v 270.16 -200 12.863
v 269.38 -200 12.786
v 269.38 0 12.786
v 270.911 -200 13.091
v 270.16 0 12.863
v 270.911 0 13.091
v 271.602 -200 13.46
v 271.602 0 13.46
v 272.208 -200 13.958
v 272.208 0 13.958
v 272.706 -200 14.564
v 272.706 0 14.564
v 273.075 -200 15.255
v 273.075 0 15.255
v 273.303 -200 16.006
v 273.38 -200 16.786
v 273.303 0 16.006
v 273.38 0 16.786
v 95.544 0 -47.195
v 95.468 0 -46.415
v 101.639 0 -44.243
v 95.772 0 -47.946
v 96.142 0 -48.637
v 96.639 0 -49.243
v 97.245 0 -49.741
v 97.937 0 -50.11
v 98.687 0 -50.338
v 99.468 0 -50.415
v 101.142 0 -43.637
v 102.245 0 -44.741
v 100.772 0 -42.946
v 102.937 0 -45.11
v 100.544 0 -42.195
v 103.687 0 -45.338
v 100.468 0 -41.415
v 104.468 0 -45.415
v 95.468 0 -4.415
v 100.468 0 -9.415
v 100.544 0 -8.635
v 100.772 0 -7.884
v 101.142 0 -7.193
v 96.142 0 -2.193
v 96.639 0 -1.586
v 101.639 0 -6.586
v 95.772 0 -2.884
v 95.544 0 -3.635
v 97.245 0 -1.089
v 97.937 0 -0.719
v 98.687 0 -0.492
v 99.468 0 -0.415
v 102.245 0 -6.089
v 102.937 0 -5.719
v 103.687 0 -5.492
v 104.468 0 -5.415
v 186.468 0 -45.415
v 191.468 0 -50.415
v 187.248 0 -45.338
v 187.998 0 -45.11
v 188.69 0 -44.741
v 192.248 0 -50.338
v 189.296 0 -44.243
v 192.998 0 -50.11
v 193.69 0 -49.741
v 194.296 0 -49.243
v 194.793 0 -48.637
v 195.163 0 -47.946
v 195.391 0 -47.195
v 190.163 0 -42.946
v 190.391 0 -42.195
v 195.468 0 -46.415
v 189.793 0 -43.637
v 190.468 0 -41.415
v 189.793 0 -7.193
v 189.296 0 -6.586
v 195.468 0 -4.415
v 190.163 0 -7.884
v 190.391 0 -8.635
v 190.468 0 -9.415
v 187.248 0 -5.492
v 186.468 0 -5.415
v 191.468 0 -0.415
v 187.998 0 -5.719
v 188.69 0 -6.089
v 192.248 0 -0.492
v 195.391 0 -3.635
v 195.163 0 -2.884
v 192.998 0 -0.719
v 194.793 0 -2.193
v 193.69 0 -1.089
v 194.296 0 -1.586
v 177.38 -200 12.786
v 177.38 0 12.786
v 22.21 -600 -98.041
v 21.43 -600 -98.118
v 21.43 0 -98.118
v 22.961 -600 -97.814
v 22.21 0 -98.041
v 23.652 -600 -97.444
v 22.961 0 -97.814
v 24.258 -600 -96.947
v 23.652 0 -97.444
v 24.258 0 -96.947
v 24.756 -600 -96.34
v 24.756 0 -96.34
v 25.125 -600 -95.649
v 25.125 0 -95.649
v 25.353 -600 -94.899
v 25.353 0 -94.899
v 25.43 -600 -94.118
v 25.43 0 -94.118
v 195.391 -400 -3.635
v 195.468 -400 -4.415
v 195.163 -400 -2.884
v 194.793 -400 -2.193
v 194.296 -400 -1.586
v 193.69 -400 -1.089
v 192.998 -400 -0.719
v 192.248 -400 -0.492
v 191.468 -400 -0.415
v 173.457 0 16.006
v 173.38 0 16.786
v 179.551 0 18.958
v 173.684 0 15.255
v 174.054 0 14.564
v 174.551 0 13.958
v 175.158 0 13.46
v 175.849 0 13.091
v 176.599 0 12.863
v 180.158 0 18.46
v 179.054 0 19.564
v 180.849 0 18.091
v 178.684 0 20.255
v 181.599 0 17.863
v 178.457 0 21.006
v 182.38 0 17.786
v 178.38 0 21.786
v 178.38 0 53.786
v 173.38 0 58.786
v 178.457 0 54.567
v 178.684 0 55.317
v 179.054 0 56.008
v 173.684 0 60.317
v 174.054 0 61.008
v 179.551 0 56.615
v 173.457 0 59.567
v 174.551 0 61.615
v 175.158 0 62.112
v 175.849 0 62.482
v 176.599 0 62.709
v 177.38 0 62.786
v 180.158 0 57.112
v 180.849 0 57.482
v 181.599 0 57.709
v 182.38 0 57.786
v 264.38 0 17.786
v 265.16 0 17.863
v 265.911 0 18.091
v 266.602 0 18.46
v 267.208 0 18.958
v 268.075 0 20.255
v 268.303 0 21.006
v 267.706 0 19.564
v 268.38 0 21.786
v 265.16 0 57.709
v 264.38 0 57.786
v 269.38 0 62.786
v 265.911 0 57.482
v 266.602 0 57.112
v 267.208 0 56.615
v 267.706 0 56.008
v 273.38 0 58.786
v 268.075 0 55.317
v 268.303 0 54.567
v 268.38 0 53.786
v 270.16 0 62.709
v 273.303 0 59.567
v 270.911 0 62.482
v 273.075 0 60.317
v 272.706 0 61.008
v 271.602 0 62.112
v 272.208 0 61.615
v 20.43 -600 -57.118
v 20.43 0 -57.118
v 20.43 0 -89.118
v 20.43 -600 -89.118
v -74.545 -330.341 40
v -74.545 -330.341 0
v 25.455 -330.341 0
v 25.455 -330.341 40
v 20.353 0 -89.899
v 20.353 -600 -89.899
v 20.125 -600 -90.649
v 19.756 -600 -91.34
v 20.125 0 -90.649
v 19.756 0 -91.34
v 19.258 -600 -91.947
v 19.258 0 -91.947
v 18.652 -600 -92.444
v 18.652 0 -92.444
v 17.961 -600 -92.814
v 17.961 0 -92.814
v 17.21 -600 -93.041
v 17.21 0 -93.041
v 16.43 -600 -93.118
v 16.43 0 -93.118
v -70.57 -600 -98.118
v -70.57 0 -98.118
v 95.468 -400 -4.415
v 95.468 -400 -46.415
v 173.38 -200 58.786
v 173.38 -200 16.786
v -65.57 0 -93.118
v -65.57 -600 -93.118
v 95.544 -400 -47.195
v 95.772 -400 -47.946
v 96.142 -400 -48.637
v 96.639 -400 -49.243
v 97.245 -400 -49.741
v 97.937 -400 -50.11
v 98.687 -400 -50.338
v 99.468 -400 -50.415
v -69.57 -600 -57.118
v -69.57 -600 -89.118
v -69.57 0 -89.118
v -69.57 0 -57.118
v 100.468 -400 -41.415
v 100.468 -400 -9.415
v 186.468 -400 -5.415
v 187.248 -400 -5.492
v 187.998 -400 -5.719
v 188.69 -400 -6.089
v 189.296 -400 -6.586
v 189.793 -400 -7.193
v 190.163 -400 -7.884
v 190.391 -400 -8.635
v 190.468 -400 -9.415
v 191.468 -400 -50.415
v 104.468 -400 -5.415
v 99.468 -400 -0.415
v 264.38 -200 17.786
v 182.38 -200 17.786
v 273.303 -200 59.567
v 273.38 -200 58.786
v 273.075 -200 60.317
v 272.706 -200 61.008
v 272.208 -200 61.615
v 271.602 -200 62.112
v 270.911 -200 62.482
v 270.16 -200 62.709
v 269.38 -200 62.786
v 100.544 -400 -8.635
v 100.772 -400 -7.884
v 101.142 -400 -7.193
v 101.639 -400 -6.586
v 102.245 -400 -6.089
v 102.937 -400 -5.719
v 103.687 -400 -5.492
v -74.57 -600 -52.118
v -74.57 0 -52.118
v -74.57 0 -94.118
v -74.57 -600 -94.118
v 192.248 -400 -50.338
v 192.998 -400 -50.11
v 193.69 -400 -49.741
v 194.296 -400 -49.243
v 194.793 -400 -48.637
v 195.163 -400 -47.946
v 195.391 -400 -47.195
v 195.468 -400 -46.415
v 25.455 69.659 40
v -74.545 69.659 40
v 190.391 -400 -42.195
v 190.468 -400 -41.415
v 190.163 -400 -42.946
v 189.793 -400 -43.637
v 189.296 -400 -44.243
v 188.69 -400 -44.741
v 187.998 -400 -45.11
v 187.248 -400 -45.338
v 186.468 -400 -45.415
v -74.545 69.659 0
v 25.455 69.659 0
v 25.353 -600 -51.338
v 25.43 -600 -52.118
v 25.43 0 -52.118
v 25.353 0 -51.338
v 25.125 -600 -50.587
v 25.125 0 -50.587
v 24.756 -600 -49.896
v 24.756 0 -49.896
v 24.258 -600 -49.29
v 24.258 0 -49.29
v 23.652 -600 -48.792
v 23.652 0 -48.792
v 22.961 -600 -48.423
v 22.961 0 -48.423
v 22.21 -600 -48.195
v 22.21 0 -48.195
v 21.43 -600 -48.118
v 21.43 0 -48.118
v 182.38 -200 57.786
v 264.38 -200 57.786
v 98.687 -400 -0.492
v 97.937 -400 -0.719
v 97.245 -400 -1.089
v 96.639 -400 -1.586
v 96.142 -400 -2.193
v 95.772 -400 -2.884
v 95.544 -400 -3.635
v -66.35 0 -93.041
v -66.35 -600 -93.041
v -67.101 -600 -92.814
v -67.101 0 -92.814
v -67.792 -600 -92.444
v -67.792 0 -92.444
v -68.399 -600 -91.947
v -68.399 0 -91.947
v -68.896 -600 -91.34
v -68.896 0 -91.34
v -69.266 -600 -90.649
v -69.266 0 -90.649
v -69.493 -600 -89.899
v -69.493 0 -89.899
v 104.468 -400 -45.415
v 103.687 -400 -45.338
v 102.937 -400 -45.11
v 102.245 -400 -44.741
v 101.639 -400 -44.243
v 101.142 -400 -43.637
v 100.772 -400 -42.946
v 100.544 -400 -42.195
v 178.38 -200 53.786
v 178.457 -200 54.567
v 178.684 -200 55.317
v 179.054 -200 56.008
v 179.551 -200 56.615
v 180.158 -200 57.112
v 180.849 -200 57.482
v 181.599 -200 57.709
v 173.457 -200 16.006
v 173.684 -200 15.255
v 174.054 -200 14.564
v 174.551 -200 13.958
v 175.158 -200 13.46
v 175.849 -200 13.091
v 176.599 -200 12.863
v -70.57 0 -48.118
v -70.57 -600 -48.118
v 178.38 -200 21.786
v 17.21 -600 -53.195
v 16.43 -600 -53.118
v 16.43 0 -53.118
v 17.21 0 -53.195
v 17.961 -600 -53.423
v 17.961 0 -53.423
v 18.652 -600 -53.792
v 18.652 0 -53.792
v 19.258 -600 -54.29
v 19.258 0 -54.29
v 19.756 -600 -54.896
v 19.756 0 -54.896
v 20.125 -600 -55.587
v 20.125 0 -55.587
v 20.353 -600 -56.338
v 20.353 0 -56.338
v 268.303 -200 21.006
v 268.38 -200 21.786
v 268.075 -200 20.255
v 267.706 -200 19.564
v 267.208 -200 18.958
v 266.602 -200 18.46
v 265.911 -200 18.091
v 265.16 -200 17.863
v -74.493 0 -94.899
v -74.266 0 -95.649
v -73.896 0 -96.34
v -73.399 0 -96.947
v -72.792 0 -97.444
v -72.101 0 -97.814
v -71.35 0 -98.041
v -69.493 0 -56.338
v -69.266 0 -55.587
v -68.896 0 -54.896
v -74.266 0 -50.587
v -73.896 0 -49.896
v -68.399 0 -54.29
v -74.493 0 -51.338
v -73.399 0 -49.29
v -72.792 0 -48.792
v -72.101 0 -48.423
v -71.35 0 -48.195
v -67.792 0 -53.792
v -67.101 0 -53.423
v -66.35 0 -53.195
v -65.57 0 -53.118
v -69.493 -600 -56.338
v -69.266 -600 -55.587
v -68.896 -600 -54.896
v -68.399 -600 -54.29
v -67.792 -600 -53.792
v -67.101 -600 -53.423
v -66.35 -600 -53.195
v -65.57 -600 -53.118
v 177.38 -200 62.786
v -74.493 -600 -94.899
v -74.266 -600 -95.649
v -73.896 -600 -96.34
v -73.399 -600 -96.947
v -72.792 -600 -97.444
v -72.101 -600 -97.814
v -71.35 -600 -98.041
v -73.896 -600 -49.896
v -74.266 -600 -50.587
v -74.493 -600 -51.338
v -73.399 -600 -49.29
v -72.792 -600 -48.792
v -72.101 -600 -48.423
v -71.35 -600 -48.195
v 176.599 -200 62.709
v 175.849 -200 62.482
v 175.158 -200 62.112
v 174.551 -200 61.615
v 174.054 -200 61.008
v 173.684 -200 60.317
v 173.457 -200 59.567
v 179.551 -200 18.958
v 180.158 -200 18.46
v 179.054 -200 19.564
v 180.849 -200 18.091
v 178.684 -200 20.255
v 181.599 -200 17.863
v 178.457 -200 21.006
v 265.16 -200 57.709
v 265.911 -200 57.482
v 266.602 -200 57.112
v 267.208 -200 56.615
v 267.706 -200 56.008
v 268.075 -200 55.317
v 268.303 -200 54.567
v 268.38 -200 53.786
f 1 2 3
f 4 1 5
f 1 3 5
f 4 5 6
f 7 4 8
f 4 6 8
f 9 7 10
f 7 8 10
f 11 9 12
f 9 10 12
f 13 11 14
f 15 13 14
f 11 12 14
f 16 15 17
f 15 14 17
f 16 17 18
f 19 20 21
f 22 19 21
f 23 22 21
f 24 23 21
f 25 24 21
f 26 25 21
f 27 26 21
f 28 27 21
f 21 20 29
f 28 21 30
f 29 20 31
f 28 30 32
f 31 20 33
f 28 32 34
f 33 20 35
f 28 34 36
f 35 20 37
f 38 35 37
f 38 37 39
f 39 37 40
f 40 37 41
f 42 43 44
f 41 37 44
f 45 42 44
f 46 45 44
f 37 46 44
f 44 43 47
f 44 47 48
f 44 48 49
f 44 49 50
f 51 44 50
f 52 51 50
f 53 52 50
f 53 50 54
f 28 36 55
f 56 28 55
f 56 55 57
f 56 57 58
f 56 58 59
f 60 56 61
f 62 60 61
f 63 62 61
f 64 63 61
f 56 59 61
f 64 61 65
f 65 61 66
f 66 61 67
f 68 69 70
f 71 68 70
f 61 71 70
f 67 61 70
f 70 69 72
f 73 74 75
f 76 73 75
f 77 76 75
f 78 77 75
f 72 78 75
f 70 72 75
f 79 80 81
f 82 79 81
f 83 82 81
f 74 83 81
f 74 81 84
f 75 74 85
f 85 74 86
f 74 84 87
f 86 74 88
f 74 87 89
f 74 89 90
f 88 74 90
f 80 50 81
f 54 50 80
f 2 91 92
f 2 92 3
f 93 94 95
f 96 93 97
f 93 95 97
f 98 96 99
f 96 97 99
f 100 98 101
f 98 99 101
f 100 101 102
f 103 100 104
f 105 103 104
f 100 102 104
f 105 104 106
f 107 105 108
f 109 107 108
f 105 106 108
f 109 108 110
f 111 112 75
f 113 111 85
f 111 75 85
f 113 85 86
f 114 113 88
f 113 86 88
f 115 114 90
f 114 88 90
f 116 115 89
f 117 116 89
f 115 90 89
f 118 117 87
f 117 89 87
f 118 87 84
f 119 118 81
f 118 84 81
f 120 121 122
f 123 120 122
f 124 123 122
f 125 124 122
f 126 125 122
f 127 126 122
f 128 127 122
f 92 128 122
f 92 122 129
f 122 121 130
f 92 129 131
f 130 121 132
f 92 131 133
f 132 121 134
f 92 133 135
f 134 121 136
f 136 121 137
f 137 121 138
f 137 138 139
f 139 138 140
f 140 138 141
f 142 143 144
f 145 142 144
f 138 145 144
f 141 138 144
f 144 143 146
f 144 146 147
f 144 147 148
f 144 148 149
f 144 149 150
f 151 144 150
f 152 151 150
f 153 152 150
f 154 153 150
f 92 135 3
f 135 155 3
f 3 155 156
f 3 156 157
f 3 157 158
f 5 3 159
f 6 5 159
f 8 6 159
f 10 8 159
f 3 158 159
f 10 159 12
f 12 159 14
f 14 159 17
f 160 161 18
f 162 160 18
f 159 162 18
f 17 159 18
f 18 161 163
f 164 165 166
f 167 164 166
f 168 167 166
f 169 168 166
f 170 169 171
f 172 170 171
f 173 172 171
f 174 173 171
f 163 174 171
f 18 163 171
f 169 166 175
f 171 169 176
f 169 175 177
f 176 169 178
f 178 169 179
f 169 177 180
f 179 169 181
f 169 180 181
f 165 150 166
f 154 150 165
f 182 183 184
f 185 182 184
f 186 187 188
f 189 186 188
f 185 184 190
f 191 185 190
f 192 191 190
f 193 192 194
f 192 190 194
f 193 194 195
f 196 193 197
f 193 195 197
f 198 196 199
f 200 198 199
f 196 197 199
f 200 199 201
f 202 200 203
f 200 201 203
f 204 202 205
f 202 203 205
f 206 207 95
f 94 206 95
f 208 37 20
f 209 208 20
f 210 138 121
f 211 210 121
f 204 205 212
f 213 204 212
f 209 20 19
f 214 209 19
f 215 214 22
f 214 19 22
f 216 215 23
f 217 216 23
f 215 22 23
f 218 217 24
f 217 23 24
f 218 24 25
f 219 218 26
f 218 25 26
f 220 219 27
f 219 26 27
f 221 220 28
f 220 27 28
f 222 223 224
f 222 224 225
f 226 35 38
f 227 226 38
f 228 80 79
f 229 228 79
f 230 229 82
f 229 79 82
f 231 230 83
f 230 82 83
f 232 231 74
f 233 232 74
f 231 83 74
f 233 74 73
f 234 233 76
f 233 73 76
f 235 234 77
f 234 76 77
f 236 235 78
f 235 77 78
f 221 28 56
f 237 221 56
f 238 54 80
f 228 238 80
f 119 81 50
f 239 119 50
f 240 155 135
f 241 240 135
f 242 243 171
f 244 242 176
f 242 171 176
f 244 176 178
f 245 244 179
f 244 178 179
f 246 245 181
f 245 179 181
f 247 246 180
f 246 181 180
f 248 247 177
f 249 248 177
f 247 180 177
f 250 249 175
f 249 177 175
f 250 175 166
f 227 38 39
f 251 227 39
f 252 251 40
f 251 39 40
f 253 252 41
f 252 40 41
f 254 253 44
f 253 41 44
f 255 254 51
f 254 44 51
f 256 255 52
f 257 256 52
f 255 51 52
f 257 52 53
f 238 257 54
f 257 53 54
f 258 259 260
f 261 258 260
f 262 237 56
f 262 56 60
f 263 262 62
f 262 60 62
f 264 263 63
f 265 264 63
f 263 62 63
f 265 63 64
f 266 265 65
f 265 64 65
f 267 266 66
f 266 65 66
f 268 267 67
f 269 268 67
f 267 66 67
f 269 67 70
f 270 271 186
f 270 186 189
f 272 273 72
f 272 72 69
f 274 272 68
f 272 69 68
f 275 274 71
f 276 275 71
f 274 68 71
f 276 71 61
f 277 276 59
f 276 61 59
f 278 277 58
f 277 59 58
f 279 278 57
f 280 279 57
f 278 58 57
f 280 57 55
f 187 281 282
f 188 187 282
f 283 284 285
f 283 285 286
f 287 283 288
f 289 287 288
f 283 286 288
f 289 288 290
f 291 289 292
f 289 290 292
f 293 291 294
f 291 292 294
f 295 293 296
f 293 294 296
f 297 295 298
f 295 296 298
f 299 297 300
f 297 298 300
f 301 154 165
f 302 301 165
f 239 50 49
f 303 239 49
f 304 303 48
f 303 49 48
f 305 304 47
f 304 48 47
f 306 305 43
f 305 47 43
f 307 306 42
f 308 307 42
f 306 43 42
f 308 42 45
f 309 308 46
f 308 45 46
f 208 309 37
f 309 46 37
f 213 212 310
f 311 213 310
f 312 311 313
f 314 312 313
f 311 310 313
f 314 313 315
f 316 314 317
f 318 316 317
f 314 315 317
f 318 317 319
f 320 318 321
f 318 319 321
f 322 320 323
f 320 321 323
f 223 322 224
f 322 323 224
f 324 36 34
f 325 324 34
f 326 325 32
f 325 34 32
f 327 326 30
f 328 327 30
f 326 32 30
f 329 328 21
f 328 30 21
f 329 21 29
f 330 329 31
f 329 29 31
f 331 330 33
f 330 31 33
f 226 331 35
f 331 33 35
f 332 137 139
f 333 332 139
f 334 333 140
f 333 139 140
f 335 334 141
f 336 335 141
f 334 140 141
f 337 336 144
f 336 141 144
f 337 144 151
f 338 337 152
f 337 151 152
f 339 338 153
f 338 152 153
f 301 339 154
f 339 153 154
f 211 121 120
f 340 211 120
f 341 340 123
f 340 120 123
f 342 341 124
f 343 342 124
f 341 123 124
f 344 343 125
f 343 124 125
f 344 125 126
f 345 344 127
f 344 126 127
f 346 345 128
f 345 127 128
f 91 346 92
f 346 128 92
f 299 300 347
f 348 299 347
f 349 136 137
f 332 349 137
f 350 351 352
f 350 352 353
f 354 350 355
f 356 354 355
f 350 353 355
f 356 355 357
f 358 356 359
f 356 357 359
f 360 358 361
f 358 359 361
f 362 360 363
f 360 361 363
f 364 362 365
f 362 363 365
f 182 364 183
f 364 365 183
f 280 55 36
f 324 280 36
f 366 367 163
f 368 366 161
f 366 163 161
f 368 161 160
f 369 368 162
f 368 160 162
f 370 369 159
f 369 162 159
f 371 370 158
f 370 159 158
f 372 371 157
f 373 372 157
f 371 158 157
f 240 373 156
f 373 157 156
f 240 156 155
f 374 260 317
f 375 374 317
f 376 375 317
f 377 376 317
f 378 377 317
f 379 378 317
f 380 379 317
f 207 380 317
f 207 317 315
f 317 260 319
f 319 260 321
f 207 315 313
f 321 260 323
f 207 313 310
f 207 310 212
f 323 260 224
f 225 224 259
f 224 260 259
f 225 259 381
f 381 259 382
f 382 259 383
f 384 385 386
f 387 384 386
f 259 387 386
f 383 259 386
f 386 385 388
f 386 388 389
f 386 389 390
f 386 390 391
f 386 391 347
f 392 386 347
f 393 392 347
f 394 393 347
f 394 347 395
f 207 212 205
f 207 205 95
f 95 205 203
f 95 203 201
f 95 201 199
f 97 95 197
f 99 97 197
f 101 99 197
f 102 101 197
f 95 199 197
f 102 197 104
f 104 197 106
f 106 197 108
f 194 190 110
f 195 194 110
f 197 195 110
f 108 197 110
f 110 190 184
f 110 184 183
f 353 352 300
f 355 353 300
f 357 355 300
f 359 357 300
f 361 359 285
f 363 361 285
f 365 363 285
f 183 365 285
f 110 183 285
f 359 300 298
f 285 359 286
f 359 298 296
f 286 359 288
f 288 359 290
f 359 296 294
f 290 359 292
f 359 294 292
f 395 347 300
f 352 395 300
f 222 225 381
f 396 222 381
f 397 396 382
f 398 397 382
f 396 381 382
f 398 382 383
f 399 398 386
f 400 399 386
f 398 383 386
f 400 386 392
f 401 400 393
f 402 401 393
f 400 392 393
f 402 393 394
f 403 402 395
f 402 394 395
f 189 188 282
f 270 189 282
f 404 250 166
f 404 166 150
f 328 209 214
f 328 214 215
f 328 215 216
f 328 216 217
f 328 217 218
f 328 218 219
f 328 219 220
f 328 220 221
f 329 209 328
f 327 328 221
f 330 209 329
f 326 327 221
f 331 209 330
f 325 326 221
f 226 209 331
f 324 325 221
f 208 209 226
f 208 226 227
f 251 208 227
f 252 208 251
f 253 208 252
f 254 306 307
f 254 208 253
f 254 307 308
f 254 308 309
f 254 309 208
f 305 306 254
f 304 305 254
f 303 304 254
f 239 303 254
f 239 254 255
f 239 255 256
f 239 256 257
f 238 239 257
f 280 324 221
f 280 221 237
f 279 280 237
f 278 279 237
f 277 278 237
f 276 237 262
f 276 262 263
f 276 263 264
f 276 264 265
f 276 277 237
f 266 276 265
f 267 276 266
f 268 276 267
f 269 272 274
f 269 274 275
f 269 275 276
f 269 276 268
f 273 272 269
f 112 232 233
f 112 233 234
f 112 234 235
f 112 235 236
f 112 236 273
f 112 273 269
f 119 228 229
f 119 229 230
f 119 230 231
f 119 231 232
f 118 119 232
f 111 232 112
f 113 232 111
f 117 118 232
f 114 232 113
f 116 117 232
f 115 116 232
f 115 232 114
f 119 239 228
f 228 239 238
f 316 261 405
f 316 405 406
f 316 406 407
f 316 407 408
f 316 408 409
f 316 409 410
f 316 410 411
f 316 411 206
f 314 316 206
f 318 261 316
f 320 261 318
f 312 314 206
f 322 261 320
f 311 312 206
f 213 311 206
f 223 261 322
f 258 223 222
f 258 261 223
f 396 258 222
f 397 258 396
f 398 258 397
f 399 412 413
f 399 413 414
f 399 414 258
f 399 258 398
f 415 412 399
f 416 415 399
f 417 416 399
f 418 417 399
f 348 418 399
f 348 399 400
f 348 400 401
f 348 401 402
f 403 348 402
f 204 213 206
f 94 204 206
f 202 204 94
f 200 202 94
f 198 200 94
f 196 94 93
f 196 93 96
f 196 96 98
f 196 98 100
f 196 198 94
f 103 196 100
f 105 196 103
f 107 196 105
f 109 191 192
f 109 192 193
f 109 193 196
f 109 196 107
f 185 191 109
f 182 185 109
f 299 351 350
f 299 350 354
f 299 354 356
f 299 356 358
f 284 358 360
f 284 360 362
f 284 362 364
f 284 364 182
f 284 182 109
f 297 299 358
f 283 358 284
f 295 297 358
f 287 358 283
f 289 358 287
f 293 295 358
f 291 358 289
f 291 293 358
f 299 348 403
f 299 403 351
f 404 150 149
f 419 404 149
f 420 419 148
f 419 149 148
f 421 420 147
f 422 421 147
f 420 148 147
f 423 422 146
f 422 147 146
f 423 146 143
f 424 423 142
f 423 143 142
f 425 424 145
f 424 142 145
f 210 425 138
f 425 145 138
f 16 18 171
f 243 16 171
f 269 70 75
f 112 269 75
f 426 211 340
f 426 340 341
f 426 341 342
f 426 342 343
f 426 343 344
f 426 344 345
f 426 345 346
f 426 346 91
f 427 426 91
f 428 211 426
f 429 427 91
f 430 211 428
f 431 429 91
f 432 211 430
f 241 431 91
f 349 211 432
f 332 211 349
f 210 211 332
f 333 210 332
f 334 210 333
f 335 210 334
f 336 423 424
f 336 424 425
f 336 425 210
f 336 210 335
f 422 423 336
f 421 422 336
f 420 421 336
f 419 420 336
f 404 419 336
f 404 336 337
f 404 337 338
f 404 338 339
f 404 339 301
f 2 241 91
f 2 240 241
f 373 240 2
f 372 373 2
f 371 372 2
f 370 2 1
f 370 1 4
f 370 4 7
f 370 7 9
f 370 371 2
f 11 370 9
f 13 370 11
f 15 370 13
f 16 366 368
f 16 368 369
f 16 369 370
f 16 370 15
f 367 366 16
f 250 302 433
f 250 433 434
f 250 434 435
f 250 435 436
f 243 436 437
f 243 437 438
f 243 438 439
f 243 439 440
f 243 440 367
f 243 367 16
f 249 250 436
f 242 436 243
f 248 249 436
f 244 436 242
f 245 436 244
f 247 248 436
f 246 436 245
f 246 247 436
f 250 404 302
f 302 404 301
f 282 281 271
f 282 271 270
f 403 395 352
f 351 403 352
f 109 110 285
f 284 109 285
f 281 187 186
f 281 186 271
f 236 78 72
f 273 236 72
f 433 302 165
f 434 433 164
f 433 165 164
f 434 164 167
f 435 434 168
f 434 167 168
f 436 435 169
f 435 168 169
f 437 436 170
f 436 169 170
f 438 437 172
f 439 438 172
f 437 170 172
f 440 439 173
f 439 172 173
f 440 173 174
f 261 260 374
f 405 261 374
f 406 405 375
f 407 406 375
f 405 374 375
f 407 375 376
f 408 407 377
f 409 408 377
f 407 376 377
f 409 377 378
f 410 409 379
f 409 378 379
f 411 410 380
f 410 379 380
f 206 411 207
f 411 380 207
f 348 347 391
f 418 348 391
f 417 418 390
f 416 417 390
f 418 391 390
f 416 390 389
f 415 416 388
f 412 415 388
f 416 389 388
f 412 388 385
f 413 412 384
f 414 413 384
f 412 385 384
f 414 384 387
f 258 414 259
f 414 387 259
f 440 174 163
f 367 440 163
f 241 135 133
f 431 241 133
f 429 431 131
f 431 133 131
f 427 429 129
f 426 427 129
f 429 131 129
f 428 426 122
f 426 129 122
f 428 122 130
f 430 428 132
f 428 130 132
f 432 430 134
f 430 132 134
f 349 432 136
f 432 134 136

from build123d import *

# Parameters (mm, degrees)
F0_W     = 100
F0_H     = 400
F1_DEPTH = 40
F3_DEPTH = 600
F5_DEPTH = 400
F7_DEPTH = 200


with BuildPart() as f1:
    # F0 (on Top) → F1 (new body)
    with BuildSketch(Plane.XY):
        with Locations((-24.545455, -130.340915)):
            Rectangle(F0_W, F0_H)
    extrude(amount=F1_DEPTH)


with BuildPart() as f3:
    # F2 (on Front) → F3 (new body)
    with BuildSketch(Plane.XZ):
        with BuildLine():
            Line((21.429882, -48.118195), (-70.570118, -48.118195))
            ThreePointArc((-70.570118, -48.118195), (-73.398545, -49.289768), (-74.570118, -52.118195))
            Line((-74.570118, -52.118195), (-74.570118, -94.118195))
            ThreePointArc((-74.570118, -94.118195), (-73.398545, -96.946623), (-70.570118, -98.118195))
            Line((-70.570118, -98.118195), (21.429882, -98.118195))
            ThreePointArc((21.429882, -98.118195), (24.258309, -96.946623), (25.429882, -94.118195))
            Line((25.429882, -94.118195), (25.429882, -52.118195))
            ThreePointArc((25.429882, -52.118195), (24.258309, -49.289768), (21.429882, -48.118195))
        make_face()
        with BuildLine():
            ThreePointArc((-69.570118, -57.118195), (-68.398545, -54.289768), (-65.570118, -53.118195))
            Line((-65.570118, -53.118195), (16.429882, -53.118195))
            ThreePointArc((16.429882, -53.118195), (19.258309, -54.289768), (20.429882, -57.118195))
            Line((20.429882, -57.118195), (20.429882, -89.118195))
            ThreePointArc((20.429882, -89.118195), (19.258309, -91.946623), (16.429882, -93.118195))
            Line((16.429882, -93.118195), (-65.570118, -93.118195))
            ThreePointArc((-65.570118, -93.118195), (-68.398545, -91.946623), (-69.570118, -89.118195))
            Line((-69.570118, -89.118195), (-69.570118, -57.118195))
        make_face(mode=Mode.SUBTRACT)
    extrude(amount=F3_DEPTH)


with BuildPart() as f5:
    # F4 (on Front) → F5 (new body)
    with BuildSketch(Plane.XZ):
        with BuildLine():
            Line((191.467564, -0.414899), (99.467564, -0.414899))
            ThreePointArc((99.467564, -0.414899), (96.639137, -1.586472), (95.467564, -4.414899))
            Line((95.467564, -4.414899), (95.467564, -46.414899))
            ThreePointArc((95.467564, -46.414899), (96.639137, -49.243326), (99.467564, -50.414899))
            Line((99.467564, -50.414899), (191.467564, -50.414899))
            ThreePointArc((191.467564, -50.414899), (194.295992, -49.243326), (195.467564, -46.414899))
            Line((195.467564, -46.414899), (195.467564, -4.414899))
            ThreePointArc((195.467564, -4.414899), (194.295992, -1.586472), (191.467564, -0.414899))
        make_face()
        with BuildLine():
            ThreePointArc((100.467564, -9.414899), (101.639137, -6.586472), (104.467564, -5.414899))
            Line((104.467564, -5.414899), (186.467564, -5.414899))
            ThreePointArc((186.467564, -5.414899), (189.295992, -6.586472), (190.467564, -9.414899))
            Line((190.467564, -9.414899), (190.467564, -41.414899))
            ThreePointArc((190.467564, -41.414899), (189.295992, -44.243326), (186.467564, -45.414899))
            Line((186.467564, -45.414899), (104.467564, -45.414899))
            ThreePointArc((104.467564, -45.414899), (101.639137, -44.243326), (100.467564, -41.414899))
            Line((100.467564, -41.414899), (100.467564, -9.414899))
        make_face(mode=Mode.SUBTRACT)
    extrude(amount=F5_DEPTH)


with BuildPart() as f7:
    # F6 (on Front) → F7 (new body)
    with BuildSketch(Plane.XZ):
        with BuildLine():
            Line((269.379806, 62.786197), (177.379806, 62.786197))
            ThreePointArc((177.379806, 62.786197), (174.551379, 61.614624), (173.379806, 58.786197))
            Line((173.379806, 58.786197), (173.379806, 16.786197))
            ThreePointArc((173.379806, 16.786197), (174.551379, 13.95777), (177.379806, 12.786197))
            Line((177.379806, 12.786197), (269.379806, 12.786197))
            ThreePointArc((269.379806, 12.786197), (272.208233, 13.95777), (273.379806, 16.786197))
            Line((273.379806, 16.786197), (273.379806, 58.786197))
            ThreePointArc((273.379806, 58.786197), (272.208233, 61.614624), (269.379806, 62.786197))
        make_face()
        with BuildLine():
            ThreePointArc((178.379806, 53.786197), (179.551379, 56.614624), (182.379806, 57.786197))
            Line((182.379806, 57.786197), (264.379806, 57.786197))
            ThreePointArc((264.379806, 57.786197), (267.208233, 56.614624), (268.379806, 53.786197))
            Line((268.379806, 53.786197), (268.379806, 21.786197))
            ThreePointArc((268.379806, 21.786197), (267.208233, 18.95777), (264.379806, 17.786197))
            Line((264.379806, 17.786197), (182.379806, 17.786197))
            ThreePointArc((182.379806, 17.786197), (179.551379, 18.95777), (178.379806, 21.786197))
            Line((178.379806, 21.786197), (178.379806, 53.786197))
        make_face(mode=Mode.SUBTRACT)
    extrude(amount=F7_DEPTH)


solid = Compound([f1.part, f3.part, f5.part, f7.part])
